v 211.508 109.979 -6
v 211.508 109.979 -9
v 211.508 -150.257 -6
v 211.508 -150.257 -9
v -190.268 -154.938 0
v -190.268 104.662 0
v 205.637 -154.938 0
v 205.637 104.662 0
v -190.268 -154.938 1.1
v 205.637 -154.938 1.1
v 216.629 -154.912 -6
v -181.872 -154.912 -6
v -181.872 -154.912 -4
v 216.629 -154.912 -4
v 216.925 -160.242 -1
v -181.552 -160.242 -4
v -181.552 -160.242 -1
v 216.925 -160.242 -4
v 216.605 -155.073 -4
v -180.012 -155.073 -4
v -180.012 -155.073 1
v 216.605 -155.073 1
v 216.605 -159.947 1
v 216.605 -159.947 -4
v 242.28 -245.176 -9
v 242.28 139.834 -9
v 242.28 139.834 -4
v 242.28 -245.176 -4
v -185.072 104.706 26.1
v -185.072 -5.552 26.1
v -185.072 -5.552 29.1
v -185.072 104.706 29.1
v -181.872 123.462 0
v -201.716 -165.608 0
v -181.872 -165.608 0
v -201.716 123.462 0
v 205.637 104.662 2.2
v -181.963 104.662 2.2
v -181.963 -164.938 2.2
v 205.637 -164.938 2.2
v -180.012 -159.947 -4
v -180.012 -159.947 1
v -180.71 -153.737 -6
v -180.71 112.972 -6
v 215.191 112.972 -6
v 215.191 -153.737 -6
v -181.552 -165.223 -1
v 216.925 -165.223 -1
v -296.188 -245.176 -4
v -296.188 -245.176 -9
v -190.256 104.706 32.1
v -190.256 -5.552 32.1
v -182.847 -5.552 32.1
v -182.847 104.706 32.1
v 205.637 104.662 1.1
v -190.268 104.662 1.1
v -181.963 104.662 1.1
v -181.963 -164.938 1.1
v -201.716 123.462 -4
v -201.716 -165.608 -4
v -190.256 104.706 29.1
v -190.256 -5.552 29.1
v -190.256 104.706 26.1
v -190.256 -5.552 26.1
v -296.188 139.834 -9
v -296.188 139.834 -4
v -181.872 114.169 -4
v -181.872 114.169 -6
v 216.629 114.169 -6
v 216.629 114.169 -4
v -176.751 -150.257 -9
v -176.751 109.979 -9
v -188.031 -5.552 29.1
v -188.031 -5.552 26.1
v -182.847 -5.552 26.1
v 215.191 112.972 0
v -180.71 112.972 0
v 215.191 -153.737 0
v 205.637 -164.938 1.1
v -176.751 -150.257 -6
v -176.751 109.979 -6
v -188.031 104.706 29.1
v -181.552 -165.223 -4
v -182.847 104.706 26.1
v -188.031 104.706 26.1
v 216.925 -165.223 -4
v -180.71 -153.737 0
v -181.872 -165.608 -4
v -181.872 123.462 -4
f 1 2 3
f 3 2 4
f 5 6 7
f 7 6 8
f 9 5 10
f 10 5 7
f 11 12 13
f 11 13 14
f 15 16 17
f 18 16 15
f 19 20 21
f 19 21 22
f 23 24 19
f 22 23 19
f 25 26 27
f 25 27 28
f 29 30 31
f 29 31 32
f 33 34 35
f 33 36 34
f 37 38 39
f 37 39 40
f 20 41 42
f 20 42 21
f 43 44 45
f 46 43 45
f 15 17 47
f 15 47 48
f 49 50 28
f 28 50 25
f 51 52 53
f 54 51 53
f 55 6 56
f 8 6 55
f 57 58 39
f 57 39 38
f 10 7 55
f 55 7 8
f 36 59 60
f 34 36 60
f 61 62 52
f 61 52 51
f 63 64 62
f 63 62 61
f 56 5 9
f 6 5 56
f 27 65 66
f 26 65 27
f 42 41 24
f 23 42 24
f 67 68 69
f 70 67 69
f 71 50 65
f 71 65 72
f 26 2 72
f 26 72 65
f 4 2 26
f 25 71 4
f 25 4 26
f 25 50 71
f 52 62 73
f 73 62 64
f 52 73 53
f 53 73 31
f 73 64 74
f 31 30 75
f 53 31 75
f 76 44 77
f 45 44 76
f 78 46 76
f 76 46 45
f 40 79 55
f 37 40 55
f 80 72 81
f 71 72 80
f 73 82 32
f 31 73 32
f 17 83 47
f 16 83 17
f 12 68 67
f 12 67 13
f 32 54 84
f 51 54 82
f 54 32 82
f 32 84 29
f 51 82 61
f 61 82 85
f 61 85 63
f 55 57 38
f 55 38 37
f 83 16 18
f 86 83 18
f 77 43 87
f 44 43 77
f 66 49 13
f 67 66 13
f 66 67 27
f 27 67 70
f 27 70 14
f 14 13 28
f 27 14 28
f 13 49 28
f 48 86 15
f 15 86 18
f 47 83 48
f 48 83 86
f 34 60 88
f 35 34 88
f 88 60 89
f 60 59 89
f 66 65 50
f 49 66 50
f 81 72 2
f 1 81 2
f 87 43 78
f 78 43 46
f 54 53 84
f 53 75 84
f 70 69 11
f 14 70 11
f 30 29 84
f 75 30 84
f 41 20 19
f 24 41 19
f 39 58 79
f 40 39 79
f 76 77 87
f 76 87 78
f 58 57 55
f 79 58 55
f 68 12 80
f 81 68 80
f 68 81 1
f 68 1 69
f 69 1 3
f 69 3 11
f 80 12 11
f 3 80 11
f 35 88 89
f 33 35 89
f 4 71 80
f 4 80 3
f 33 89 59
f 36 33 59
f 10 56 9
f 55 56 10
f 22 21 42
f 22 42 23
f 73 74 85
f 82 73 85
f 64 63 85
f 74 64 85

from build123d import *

# Parameters (mm, degrees)
F0_W      = 395.9047932061
F0_H      = 259.6
F1_DEPTH  = 1.1
F2_W      = 387.6
F2_H      = 269.6
F3_DEPTH  = 1.1
F5_W      = 538.467913866
F5_H      = 385.010138154
F5_W_2    = 398.5009938478
F5_H_2    = 269.0812945366
F6_DEPTH  = 5
F5_W_3    = 388.2591426373
F5_H_3    = 260.2360546589
F7_DEPTH  = 3
F9_DEPTH  = 4
F10_W     = 398.476421833
F10_H     = 4.9810558558
F11_DEPTH = 3
F12_W     = 395.9012627602
F12_H     = 266.7091116309
F13_DEPTH = 6
F14_W     = 396.6173790395
F14_H     = 4.8736184835
F15_DEPTH = 5
F17_W     = 2.2251938702
F17_H     = 110.2578239515
F18_DEPTH = 3
F19_W     = 5.1836705661
F19_H     = 110.2578239515
F19_W_2   = 2.2251938702
F20_DEPTH = 3


with BuildPart() as f1:
    # F0 (on Top) → F1 (new body)
    with BuildSketch(Plane.XY):
        with Locations((7.6845915152, -25.1384339285)):
            Rectangle(F0_W, F0_H)
    extrude(amount=F1_DEPTH)


with BuildPart() as f3:
    # F2 (on face) → F3 (new body)
    with BuildSketch(Plane.XY.offset(1.1)):
        with Locations((11.8369881183, -30.1384339285)):
            Rectangle(F2_W, F2_H)
    extrude(amount=F3_DEPTH)


with BuildPart() as f6:
    # F5 (on offset) → F6 (new body)
    with BuildSketch(Plane(origin=(0, 0, -9), x_dir=(1, 0, 0), z_dir=(0, 0, -1))):
        with Locations((-26.9538611174, 52.670635283)):
            Rectangle(F5_W, F5_H)
        with Locations((17.3784866929, 20.3713178635)):
            Rectangle(F5_W_2, F5_H_2, mode=Mode.SUBTRACT)
    extrude(amount=-F6_DEPTH)

    # F5 (on offset) → F7 (join)
    with BuildSketch(Plane(origin=(0, 0, -9), x_dir=(1, 0, 0), z_dir=(0, 0, -1))):
        with Locations((17.3784866929, 20.3713178635)):
            Rectangle(F5_W_2, F5_H_2)
        with Locations((17.3784792423, 20.1385468245)):
            Rectangle(F5_W_3, F5_H_3, mode=Mode.SUBTRACT)
    extrude(amount=-F7_DEPTH)


with BuildPart() as f9:
    # F8 (on face) → F9 (new body)
    with BuildSketch(Plane.XY.offset(-4)):
        Polygon((-201.7163038254, -165.6083017588), (-181.872010231, -165.6083017588), (-181.872010231, -154.9119651318), (-181.872010231, 114.1693294048), (-181.872010231, 123.4622597694), (-201.7163038254, 123.4622597694), align=None)
    extrude(amount=F9_DEPTH)


with BuildPart() as f11:
    # F10 (on face) → F11 (new body)
    with BuildSketch(Plane.XY.offset(-4)):
        with Locations((17.6865756512, -162.7328619361)):
            Rectangle(F10_W, F10_H)
    extrude(amount=F11_DEPTH)


with BuildPart() as f13:
    # F12 (on face) → F13 (new body)
    with BuildSketch(Plane.XY.offset(-6)):
        with Locations((17.2403156757, -20.3822143376)):
            Rectangle(F12_W, F12_H)
    extrude(amount=F13_DEPTH)


with BuildPart() as f15:
    # F14 (on face) → F15 (new body)
    with BuildSketch(Plane.XY.offset(-4)):
        with Locations((18.2966273278, -157.5099304318)):
            Rectangle(F14_W, F14_H)
    extrude(amount=F15_DEPTH)


with BuildPart() as f18:
    # F17 (on offset) → F18 (new body)
    with BuildSketch(Plane.XY.offset(26.1)):
        with Locations((-183.9597469651, 49.5766887216)):
            Rectangle(F17_W, F17_H)
    extrude(amount=F18_DEPTH)



with BuildPart() as f18b:
    # F17 (on offset) → F18, piece 2 (new body)
    with BuildSketch(Plane.XY.offset(26.1)):
        with Locations((-189.1434175312, 49.5766887216)):
            Rectangle(F17_W, F17_H)
    extrude(amount=F18_DEPTH)


with BuildPart() as f18_1:
    add(f18.part)

    add(f18b.part)  # F20 merges F18b
    # F19 (on face) → F20 (join)
    with BuildSketch(Plane.XY.offset(29.1)):
        with Locations((-187.6641791833, 49.5766887216)):
            Rectangle(F19_W, F19_H)
        with Locations((-183.9597469651, 49.5766887216)):
            Rectangle(F19_W_2, F19_H)
    extrude(amount=F20_DEPTH)


solid = Compound([f1.part, f3.part, f6.part, f9.part, f11.part, f13.part, f15.part, f18_1.part])
